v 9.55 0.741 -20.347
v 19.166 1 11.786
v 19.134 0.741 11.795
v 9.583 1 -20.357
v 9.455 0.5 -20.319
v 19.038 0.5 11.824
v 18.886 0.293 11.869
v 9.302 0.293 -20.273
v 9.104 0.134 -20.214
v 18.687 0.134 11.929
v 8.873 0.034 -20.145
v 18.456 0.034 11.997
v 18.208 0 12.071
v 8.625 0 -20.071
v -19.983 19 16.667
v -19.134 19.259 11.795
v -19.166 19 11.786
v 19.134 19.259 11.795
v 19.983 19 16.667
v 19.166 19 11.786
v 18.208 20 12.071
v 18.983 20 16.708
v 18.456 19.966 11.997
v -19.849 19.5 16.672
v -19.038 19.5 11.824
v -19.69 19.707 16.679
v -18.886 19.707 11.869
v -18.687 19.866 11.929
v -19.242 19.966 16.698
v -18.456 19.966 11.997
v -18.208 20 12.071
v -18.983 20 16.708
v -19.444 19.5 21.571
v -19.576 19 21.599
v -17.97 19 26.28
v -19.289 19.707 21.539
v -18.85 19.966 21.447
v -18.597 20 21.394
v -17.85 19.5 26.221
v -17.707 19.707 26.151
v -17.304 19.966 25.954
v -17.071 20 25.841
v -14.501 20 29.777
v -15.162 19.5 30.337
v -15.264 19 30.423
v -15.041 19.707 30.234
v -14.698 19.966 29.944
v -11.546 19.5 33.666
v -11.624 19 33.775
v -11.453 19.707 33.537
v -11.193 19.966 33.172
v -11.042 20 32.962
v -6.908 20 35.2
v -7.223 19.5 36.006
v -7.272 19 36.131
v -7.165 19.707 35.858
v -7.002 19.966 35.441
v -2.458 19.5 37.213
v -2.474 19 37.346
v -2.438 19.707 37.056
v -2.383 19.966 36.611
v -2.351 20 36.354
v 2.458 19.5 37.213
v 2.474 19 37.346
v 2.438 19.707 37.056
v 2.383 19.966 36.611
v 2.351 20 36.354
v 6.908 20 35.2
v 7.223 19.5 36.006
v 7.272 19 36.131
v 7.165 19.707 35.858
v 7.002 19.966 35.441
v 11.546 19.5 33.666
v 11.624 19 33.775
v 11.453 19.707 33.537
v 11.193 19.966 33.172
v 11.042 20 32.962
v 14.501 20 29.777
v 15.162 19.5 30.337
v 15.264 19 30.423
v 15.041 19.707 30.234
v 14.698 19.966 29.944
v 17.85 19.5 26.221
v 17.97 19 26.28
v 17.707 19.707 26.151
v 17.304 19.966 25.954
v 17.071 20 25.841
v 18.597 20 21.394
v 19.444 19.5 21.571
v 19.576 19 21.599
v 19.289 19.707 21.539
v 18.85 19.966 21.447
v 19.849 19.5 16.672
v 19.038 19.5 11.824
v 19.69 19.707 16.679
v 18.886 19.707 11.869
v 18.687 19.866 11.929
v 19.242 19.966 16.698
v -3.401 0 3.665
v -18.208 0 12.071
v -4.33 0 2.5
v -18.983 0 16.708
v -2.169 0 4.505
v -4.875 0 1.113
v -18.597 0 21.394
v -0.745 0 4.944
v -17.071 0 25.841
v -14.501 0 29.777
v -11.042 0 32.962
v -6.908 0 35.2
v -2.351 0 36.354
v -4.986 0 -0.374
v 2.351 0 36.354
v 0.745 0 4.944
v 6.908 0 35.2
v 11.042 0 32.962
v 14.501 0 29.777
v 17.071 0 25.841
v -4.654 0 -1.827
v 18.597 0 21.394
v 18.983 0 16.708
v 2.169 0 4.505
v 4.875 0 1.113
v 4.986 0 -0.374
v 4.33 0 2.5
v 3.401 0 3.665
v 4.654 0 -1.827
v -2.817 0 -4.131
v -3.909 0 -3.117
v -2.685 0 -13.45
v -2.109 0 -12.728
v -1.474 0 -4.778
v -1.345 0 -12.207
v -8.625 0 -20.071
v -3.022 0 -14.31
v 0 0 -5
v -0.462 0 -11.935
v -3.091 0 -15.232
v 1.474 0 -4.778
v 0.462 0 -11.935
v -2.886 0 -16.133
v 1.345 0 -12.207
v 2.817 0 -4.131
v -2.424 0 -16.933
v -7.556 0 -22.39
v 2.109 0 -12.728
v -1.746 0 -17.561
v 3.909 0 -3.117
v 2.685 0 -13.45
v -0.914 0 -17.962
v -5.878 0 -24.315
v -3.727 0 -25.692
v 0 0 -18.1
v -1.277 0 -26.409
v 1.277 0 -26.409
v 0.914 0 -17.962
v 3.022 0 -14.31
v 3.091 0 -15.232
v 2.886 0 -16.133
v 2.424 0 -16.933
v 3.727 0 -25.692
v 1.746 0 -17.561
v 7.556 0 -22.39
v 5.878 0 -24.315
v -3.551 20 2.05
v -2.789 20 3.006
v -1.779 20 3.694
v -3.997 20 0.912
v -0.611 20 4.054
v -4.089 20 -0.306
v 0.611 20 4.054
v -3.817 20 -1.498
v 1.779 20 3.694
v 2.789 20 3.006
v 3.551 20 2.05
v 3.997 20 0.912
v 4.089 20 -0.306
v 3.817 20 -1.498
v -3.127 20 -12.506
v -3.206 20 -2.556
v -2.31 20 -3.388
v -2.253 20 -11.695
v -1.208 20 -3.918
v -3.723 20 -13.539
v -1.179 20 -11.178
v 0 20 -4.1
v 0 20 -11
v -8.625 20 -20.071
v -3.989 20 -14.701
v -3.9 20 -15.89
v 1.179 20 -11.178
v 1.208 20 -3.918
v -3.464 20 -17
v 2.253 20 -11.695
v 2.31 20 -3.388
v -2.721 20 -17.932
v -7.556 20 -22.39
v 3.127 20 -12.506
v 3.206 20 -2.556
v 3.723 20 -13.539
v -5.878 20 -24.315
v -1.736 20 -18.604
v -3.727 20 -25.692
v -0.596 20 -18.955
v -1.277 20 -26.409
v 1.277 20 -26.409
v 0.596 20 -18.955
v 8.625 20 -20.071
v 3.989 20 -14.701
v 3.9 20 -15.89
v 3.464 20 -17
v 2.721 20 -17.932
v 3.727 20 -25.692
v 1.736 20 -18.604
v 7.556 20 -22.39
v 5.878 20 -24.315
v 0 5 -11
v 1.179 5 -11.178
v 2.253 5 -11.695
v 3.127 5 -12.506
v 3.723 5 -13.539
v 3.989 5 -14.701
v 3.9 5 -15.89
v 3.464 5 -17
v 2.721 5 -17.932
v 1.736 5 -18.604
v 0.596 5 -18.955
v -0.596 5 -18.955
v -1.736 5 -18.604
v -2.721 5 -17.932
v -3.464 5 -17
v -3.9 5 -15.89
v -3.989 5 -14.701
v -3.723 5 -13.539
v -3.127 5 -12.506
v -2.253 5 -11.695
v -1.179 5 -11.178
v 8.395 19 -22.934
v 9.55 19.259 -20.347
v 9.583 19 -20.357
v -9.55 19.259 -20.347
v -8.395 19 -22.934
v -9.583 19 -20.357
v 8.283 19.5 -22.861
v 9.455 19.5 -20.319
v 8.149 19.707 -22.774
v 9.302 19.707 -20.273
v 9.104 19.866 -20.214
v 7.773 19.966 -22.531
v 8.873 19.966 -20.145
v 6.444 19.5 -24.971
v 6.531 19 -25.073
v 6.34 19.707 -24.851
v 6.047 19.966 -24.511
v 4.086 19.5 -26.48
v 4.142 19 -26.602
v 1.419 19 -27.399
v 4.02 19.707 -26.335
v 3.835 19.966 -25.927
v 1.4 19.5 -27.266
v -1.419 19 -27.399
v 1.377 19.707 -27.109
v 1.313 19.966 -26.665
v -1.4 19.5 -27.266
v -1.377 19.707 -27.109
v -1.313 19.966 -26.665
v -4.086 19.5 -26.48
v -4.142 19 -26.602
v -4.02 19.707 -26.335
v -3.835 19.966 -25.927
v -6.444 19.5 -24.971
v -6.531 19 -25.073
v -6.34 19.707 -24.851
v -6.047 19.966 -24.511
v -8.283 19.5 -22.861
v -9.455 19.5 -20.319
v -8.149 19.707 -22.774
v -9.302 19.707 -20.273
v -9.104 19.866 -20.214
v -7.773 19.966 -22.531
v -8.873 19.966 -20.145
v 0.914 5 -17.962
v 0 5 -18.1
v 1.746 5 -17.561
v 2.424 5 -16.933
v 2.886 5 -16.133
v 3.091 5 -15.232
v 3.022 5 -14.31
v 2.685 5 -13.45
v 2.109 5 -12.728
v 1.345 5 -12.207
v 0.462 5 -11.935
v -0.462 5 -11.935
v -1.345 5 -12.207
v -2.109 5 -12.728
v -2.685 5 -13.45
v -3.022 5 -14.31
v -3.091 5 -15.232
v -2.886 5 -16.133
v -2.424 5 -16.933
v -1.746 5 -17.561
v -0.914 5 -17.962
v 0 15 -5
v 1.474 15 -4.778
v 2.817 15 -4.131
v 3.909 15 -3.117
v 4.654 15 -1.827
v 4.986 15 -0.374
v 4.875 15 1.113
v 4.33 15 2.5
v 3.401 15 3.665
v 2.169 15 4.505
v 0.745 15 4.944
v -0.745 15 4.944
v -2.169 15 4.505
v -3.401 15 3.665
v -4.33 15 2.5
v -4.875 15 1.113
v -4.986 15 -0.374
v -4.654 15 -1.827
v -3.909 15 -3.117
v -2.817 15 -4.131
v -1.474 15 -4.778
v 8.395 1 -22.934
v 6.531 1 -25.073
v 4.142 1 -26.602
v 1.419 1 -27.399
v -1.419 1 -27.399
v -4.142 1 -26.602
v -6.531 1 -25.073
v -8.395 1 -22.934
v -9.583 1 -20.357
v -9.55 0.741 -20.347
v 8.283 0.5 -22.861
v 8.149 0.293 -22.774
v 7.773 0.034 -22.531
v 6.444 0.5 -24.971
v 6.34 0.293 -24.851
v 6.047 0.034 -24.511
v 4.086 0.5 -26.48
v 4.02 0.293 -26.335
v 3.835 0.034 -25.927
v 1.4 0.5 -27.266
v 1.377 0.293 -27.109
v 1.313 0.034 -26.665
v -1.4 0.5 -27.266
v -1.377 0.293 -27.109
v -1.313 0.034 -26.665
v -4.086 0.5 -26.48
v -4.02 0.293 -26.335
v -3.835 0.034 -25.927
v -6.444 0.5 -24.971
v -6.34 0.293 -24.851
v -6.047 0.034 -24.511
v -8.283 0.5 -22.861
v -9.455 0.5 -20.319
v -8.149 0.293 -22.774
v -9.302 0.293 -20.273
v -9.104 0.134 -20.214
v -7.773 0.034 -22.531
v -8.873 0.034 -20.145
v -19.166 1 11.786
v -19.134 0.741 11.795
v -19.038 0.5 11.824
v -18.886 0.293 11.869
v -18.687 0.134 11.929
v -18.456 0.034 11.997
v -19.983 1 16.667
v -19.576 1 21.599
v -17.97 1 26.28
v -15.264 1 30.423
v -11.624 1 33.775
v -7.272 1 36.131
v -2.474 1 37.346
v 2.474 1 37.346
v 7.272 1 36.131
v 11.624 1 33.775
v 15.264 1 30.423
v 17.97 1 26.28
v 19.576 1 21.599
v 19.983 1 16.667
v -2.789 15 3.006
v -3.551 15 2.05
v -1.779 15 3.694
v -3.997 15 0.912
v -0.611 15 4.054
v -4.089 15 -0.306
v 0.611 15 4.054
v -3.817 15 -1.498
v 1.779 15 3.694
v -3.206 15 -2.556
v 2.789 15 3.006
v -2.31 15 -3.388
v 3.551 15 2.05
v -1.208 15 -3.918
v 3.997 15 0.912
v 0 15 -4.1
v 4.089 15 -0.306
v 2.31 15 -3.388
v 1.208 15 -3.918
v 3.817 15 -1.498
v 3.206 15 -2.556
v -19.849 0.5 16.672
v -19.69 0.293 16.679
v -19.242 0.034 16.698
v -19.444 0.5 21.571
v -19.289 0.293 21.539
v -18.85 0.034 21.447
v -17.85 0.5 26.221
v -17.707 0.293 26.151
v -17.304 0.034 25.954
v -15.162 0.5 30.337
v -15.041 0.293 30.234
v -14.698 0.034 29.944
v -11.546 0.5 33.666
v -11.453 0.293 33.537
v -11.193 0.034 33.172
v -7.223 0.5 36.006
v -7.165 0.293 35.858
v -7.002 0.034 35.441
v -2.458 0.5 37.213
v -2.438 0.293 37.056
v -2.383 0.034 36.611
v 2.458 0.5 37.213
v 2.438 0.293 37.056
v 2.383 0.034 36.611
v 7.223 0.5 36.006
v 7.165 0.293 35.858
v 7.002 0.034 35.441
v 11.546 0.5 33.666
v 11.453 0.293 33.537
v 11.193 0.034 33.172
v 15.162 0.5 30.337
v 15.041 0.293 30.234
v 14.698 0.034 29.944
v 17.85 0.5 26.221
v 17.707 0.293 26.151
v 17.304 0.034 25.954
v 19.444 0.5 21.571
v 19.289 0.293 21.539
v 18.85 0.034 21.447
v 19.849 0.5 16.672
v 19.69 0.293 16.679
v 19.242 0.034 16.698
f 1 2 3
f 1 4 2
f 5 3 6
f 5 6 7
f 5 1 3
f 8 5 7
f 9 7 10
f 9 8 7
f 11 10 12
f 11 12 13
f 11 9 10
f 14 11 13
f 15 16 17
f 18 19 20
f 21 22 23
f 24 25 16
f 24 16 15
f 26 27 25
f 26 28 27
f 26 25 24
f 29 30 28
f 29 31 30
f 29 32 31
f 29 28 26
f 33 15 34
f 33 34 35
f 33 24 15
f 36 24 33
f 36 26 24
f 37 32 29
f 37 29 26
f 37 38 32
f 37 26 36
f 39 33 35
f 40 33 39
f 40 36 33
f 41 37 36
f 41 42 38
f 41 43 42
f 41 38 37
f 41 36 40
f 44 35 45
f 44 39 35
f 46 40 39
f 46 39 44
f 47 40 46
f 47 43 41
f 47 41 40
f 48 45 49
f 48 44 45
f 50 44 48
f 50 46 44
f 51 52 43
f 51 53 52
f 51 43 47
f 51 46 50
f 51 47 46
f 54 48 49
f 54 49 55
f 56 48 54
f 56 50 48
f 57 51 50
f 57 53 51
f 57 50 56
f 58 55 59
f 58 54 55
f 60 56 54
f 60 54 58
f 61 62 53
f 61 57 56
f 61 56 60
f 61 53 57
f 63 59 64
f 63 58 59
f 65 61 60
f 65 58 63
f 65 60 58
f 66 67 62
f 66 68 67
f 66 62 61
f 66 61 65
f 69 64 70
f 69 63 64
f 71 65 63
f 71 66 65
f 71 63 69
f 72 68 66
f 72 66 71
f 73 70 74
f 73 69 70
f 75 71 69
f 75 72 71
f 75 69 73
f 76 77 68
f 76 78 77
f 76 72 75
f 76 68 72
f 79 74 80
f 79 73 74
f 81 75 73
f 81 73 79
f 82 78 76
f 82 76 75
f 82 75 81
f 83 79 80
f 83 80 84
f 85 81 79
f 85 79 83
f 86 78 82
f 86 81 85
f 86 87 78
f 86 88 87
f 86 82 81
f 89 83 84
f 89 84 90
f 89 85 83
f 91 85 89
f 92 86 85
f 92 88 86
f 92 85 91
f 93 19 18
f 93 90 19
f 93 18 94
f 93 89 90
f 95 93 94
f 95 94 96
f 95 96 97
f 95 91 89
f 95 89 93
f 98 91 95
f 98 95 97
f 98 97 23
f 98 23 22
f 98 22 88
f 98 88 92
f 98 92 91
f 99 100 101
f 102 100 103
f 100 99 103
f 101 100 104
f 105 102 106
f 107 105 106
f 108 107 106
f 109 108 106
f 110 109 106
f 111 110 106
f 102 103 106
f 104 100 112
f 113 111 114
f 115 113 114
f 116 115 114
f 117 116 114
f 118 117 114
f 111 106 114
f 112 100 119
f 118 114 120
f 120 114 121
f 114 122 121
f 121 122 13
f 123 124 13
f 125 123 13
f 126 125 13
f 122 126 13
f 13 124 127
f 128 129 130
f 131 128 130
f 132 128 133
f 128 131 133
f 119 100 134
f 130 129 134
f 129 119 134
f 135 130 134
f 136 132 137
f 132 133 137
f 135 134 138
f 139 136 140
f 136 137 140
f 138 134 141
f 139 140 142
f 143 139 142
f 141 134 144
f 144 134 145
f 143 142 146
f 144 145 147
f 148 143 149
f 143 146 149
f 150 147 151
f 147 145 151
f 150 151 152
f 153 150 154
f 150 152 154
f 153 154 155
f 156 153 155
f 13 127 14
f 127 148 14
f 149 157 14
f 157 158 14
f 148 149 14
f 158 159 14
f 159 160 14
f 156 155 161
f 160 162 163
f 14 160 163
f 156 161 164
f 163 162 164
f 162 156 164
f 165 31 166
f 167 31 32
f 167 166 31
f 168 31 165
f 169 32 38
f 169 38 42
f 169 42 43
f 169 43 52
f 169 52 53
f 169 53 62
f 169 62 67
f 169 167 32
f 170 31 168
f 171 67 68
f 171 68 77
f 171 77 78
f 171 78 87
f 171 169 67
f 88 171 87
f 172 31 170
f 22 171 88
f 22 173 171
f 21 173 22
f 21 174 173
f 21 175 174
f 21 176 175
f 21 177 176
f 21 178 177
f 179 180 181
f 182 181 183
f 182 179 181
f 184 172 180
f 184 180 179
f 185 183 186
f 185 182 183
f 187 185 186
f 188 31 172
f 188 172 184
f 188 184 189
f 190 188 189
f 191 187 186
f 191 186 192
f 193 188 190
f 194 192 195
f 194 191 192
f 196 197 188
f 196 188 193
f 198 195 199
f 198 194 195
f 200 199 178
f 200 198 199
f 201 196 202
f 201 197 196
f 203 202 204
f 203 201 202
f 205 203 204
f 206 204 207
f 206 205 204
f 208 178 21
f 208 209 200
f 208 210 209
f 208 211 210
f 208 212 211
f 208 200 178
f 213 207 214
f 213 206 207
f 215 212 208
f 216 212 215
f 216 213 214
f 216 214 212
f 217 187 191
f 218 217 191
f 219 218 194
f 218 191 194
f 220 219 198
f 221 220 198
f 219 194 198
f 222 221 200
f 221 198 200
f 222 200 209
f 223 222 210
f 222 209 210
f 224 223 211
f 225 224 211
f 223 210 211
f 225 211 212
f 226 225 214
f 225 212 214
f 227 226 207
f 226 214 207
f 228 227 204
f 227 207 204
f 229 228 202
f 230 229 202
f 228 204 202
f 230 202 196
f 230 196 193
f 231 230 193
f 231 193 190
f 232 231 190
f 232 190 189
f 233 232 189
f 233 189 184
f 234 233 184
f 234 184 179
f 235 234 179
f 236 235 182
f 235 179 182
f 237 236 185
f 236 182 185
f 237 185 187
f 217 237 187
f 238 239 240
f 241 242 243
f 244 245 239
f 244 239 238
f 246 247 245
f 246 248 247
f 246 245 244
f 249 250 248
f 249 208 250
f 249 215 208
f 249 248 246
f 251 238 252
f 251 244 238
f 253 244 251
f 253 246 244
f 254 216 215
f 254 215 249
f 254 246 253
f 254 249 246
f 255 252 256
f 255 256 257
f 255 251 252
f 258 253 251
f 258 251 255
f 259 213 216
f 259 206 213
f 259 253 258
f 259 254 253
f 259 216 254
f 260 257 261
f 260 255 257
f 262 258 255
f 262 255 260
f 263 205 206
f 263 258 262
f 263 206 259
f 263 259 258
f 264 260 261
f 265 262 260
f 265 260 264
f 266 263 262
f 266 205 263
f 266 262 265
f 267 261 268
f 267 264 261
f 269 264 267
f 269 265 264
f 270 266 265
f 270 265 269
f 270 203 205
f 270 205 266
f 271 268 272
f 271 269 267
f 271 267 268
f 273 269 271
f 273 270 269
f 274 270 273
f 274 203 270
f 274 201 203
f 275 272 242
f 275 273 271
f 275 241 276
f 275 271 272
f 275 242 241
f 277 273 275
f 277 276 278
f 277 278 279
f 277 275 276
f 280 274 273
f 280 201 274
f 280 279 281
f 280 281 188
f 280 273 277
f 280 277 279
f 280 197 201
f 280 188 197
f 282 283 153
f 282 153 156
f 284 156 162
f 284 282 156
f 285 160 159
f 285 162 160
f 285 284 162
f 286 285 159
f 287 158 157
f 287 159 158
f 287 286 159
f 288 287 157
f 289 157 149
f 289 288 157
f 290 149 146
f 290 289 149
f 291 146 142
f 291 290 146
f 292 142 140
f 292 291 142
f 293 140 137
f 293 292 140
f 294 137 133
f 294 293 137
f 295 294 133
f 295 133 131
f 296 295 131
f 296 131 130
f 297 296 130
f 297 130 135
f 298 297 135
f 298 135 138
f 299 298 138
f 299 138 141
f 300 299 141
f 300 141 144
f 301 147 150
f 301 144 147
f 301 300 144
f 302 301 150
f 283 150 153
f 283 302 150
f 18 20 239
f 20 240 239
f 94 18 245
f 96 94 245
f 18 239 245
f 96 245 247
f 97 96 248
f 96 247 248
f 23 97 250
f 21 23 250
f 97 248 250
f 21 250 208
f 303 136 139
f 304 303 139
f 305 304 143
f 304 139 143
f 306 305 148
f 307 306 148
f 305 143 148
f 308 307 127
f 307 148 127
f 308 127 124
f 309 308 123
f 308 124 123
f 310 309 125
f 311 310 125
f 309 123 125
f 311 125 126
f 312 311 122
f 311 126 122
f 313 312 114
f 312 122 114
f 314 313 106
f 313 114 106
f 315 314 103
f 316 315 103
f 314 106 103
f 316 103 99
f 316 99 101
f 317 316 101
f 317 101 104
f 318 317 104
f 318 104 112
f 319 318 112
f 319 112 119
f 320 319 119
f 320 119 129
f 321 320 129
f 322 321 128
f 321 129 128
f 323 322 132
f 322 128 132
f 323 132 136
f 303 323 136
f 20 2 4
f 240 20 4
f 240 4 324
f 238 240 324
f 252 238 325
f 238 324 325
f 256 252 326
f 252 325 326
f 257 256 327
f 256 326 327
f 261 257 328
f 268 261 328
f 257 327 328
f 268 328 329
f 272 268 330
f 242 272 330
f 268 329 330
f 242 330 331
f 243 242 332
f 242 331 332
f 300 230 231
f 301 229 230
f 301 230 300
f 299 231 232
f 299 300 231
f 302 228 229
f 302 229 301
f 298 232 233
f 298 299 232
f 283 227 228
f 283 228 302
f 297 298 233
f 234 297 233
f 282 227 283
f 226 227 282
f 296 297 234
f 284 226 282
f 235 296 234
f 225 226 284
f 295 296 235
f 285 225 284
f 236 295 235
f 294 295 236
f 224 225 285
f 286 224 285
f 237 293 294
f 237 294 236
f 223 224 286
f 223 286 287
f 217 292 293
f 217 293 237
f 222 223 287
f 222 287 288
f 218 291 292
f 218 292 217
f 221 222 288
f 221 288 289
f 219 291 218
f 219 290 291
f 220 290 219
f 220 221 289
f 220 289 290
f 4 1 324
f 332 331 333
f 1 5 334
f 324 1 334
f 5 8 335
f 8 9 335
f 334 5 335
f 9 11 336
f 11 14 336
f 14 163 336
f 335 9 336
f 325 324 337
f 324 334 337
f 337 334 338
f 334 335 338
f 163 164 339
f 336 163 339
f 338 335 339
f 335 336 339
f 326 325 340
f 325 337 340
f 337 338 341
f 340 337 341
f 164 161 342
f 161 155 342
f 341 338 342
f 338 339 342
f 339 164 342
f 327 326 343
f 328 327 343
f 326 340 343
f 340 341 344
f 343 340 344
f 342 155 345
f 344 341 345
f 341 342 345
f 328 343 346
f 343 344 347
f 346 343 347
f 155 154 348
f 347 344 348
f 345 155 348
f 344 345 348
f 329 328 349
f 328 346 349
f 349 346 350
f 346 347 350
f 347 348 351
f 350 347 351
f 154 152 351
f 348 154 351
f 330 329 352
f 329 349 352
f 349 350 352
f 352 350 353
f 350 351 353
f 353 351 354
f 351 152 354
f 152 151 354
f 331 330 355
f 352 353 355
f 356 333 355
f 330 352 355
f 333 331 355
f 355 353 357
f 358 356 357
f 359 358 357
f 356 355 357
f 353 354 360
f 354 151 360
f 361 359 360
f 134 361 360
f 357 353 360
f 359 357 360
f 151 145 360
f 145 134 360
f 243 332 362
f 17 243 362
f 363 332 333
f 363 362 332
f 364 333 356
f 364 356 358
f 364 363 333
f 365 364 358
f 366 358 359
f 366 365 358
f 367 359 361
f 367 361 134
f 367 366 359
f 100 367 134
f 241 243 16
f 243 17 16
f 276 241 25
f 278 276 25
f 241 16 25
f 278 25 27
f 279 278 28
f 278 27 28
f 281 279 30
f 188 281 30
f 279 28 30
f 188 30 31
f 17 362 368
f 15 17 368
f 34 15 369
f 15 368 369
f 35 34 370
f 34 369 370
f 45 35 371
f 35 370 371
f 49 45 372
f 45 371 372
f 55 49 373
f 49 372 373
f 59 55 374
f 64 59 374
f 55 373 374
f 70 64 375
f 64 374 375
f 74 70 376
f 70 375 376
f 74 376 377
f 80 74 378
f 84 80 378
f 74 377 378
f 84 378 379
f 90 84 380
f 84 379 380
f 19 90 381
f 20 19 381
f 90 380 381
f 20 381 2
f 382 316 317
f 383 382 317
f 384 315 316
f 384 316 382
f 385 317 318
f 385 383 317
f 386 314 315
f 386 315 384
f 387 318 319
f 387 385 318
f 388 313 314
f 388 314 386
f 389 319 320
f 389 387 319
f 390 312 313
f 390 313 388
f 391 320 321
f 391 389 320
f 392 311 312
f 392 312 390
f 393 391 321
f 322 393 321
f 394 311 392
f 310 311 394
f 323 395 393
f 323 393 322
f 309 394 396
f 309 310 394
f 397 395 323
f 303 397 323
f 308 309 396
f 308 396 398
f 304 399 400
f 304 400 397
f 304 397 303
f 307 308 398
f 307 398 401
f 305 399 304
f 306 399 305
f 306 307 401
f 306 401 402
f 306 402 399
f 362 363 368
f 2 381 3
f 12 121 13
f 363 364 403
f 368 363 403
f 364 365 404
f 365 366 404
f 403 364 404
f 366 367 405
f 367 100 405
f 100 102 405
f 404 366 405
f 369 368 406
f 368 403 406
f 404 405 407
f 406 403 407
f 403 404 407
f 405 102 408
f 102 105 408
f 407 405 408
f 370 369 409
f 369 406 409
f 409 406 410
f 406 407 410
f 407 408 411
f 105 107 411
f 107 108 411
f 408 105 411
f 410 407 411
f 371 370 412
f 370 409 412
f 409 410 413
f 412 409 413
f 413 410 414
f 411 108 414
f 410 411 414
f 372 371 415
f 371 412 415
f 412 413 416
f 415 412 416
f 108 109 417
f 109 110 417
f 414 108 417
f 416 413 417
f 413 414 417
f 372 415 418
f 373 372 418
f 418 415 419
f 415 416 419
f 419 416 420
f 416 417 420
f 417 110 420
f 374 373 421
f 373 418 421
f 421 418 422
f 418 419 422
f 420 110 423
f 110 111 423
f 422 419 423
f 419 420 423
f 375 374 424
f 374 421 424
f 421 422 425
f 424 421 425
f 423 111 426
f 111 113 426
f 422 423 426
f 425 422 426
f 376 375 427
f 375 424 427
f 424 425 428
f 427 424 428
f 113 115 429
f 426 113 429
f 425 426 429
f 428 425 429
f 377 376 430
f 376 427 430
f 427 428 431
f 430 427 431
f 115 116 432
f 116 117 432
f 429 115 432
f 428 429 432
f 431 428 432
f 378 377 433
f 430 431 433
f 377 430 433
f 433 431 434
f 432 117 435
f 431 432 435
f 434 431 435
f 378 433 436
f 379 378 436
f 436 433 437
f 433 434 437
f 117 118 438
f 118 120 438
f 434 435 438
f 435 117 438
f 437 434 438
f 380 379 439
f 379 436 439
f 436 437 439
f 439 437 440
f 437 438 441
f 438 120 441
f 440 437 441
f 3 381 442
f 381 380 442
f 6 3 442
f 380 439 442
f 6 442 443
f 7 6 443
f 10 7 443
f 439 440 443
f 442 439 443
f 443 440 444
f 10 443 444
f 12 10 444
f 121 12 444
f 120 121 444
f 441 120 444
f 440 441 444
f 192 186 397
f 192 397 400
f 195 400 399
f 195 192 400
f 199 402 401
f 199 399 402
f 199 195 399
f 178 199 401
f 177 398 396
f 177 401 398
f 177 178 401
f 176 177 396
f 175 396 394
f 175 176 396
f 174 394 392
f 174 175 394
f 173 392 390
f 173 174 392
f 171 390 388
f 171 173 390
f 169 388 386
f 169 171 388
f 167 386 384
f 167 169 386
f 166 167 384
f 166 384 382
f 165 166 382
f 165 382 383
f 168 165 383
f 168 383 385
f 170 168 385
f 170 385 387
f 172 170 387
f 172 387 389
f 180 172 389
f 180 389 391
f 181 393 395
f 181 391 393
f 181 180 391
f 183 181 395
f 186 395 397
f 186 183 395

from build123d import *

# Parameters (mm, degrees)
BOSS_EXTRUDE1_DEPTH     = 20
FILLET1_R               = 1
SKETCH2_R               = 4
CUT_EXTRUDE1_DEPTH      = 15
SKETCH3_R               = 5
CUT_EXTRUDE2_DEPTH      = 15
CUT_EXTRUDE3_DEPTH      = 46.069390988
CUT_EXTRUDE3_DEPTH_BACK = 46.069390988
SKETCH4_R               = 4.1
SKETCH4_R_2             = 3.1


with BuildPart() as part:
    # Sketch1 → Boss-Extrude1 (new body)
    with BuildSketch(Plane(origin=(0, 0, 0), x_dir=(1, 0, 0), z_dir=(0, 1, 0))):
        with BuildLine():
            Line((-9.583148475, 20.357142857), (-19.16629695, -11.785714286))
            ThreePointArc((-19.16629695, -11.785714286), (0, -37.5), (19.16629695, -11.785714286))
            Line((19.16629695, -11.785714286), (9.583148475, 20.357142857))
            ThreePointArc((9.583148475, 20.357142857), (0, 27.5), (-9.583148475, 20.357142857))
        make_face()
    extrude(amount=BOSS_EXTRUDE1_DEPTH)

    # Fillet1
    fillet1_edges = [part.edges().sort_by_distance(p)[0] for p in [
        (0, 20, -27.5),
        (-14.374722712, 20, -4.285714286),
        (0, 20, 37.5),
        (-14.374722712, 0, -4.285714286),
        (0, 0, -27.5),
        (14.374722712, 0, -4.285714286),
        (0, 0, 37.5),
        (14.374722712, 20, -4.285714286),
    ]]
    fillet(fillet1_edges, radius=FILLET1_R)

    # Sketch2 → Cut-Extrude1 (cut)
    with BuildSketch(Plane(origin=(0, 20, 0), x_dir=(1, 0, 0), z_dir=(0, 1, 0))):
        with Locations(Location((0, 15, 0), (0, 0, 270))):
            Circle(SKETCH2_R)
    extrude(amount=-CUT_EXTRUDE1_DEPTH, mode=Mode.SUBTRACT)

    # Sketch3 → Cut-Extrude2 (cut)
    with BuildSketch(Plane.XZ):
        with Locations(Location((0, 0, 0), (0, 0, 270))):
            Circle(SKETCH3_R)
    extrude(amount=-CUT_EXTRUDE2_DEPTH, mode=Mode.SUBTRACT)

    # Sketch4 → Cut-Extrude3 (cut, two sides: drawn at the far end of the back side and taken through both)
    with BuildSketch(Plane.XZ.offset(-15).offset(-CUT_EXTRUDE3_DEPTH_BACK)):
        with Locations(Location((0, 0, 0), (0, 0, 270))):
            Circle(SKETCH4_R)
        with Locations(Location((0, -15, 0), (0, 0, 270))):
            Circle(SKETCH4_R_2)
    extrude(amount=CUT_EXTRUDE3_DEPTH + CUT_EXTRUDE3_DEPTH_BACK, mode=Mode.SUBTRACT)


solid = part.part
